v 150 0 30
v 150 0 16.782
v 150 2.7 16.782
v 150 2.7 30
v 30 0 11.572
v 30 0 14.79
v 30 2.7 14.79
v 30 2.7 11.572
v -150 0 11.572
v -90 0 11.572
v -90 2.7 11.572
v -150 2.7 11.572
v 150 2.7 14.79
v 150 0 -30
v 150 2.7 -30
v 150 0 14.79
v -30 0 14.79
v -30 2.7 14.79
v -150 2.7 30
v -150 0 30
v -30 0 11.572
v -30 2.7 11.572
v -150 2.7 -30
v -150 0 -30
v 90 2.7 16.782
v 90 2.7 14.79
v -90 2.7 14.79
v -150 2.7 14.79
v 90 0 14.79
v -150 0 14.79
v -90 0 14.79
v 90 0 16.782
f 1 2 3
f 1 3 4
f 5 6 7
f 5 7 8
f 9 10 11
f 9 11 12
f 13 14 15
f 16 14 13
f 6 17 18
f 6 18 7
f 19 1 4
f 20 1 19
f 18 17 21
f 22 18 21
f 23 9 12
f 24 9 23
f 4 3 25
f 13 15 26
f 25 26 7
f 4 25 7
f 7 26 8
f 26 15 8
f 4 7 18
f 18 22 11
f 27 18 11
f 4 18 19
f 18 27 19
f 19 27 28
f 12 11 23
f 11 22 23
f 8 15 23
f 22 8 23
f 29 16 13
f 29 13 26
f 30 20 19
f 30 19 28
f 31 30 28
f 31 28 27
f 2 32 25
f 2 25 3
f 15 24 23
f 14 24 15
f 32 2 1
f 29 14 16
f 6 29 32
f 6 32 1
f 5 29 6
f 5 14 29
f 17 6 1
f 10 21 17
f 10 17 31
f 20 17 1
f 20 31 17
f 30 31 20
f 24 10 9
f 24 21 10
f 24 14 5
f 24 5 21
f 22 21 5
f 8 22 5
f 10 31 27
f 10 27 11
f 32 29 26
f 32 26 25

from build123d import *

# Parameters (mm, degrees)
SKETCH1_W           = 60
SKETCH1_H           = 3.218
BOSS_EXTRUDE1_DEPTH = 2.7


with BuildPart() as part:
    # Sketch1 → Boss-Extrude1 (new body)
    with BuildSketch(Plane(origin=(0, 0, 0), x_dir=(1, 0, 0), z_dir=(0, 1, 0))):
        Polygon((-150, -14.79), (-90, -14.79), (-90, -11.572), (-150, -11.572), (-150, 30), (150, 30), (150, -14.79), (90, -14.79), (90, -16.782), (150, -16.782), (150, -30), (-150, -30), align=None)
        with Locations((0, -13.181)):
            Rectangle(SKETCH1_W, SKETCH1_H, mode=Mode.SUBTRACT)
    extrude(amount=BOSS_EXTRUDE1_DEPTH)


solid = part.part
